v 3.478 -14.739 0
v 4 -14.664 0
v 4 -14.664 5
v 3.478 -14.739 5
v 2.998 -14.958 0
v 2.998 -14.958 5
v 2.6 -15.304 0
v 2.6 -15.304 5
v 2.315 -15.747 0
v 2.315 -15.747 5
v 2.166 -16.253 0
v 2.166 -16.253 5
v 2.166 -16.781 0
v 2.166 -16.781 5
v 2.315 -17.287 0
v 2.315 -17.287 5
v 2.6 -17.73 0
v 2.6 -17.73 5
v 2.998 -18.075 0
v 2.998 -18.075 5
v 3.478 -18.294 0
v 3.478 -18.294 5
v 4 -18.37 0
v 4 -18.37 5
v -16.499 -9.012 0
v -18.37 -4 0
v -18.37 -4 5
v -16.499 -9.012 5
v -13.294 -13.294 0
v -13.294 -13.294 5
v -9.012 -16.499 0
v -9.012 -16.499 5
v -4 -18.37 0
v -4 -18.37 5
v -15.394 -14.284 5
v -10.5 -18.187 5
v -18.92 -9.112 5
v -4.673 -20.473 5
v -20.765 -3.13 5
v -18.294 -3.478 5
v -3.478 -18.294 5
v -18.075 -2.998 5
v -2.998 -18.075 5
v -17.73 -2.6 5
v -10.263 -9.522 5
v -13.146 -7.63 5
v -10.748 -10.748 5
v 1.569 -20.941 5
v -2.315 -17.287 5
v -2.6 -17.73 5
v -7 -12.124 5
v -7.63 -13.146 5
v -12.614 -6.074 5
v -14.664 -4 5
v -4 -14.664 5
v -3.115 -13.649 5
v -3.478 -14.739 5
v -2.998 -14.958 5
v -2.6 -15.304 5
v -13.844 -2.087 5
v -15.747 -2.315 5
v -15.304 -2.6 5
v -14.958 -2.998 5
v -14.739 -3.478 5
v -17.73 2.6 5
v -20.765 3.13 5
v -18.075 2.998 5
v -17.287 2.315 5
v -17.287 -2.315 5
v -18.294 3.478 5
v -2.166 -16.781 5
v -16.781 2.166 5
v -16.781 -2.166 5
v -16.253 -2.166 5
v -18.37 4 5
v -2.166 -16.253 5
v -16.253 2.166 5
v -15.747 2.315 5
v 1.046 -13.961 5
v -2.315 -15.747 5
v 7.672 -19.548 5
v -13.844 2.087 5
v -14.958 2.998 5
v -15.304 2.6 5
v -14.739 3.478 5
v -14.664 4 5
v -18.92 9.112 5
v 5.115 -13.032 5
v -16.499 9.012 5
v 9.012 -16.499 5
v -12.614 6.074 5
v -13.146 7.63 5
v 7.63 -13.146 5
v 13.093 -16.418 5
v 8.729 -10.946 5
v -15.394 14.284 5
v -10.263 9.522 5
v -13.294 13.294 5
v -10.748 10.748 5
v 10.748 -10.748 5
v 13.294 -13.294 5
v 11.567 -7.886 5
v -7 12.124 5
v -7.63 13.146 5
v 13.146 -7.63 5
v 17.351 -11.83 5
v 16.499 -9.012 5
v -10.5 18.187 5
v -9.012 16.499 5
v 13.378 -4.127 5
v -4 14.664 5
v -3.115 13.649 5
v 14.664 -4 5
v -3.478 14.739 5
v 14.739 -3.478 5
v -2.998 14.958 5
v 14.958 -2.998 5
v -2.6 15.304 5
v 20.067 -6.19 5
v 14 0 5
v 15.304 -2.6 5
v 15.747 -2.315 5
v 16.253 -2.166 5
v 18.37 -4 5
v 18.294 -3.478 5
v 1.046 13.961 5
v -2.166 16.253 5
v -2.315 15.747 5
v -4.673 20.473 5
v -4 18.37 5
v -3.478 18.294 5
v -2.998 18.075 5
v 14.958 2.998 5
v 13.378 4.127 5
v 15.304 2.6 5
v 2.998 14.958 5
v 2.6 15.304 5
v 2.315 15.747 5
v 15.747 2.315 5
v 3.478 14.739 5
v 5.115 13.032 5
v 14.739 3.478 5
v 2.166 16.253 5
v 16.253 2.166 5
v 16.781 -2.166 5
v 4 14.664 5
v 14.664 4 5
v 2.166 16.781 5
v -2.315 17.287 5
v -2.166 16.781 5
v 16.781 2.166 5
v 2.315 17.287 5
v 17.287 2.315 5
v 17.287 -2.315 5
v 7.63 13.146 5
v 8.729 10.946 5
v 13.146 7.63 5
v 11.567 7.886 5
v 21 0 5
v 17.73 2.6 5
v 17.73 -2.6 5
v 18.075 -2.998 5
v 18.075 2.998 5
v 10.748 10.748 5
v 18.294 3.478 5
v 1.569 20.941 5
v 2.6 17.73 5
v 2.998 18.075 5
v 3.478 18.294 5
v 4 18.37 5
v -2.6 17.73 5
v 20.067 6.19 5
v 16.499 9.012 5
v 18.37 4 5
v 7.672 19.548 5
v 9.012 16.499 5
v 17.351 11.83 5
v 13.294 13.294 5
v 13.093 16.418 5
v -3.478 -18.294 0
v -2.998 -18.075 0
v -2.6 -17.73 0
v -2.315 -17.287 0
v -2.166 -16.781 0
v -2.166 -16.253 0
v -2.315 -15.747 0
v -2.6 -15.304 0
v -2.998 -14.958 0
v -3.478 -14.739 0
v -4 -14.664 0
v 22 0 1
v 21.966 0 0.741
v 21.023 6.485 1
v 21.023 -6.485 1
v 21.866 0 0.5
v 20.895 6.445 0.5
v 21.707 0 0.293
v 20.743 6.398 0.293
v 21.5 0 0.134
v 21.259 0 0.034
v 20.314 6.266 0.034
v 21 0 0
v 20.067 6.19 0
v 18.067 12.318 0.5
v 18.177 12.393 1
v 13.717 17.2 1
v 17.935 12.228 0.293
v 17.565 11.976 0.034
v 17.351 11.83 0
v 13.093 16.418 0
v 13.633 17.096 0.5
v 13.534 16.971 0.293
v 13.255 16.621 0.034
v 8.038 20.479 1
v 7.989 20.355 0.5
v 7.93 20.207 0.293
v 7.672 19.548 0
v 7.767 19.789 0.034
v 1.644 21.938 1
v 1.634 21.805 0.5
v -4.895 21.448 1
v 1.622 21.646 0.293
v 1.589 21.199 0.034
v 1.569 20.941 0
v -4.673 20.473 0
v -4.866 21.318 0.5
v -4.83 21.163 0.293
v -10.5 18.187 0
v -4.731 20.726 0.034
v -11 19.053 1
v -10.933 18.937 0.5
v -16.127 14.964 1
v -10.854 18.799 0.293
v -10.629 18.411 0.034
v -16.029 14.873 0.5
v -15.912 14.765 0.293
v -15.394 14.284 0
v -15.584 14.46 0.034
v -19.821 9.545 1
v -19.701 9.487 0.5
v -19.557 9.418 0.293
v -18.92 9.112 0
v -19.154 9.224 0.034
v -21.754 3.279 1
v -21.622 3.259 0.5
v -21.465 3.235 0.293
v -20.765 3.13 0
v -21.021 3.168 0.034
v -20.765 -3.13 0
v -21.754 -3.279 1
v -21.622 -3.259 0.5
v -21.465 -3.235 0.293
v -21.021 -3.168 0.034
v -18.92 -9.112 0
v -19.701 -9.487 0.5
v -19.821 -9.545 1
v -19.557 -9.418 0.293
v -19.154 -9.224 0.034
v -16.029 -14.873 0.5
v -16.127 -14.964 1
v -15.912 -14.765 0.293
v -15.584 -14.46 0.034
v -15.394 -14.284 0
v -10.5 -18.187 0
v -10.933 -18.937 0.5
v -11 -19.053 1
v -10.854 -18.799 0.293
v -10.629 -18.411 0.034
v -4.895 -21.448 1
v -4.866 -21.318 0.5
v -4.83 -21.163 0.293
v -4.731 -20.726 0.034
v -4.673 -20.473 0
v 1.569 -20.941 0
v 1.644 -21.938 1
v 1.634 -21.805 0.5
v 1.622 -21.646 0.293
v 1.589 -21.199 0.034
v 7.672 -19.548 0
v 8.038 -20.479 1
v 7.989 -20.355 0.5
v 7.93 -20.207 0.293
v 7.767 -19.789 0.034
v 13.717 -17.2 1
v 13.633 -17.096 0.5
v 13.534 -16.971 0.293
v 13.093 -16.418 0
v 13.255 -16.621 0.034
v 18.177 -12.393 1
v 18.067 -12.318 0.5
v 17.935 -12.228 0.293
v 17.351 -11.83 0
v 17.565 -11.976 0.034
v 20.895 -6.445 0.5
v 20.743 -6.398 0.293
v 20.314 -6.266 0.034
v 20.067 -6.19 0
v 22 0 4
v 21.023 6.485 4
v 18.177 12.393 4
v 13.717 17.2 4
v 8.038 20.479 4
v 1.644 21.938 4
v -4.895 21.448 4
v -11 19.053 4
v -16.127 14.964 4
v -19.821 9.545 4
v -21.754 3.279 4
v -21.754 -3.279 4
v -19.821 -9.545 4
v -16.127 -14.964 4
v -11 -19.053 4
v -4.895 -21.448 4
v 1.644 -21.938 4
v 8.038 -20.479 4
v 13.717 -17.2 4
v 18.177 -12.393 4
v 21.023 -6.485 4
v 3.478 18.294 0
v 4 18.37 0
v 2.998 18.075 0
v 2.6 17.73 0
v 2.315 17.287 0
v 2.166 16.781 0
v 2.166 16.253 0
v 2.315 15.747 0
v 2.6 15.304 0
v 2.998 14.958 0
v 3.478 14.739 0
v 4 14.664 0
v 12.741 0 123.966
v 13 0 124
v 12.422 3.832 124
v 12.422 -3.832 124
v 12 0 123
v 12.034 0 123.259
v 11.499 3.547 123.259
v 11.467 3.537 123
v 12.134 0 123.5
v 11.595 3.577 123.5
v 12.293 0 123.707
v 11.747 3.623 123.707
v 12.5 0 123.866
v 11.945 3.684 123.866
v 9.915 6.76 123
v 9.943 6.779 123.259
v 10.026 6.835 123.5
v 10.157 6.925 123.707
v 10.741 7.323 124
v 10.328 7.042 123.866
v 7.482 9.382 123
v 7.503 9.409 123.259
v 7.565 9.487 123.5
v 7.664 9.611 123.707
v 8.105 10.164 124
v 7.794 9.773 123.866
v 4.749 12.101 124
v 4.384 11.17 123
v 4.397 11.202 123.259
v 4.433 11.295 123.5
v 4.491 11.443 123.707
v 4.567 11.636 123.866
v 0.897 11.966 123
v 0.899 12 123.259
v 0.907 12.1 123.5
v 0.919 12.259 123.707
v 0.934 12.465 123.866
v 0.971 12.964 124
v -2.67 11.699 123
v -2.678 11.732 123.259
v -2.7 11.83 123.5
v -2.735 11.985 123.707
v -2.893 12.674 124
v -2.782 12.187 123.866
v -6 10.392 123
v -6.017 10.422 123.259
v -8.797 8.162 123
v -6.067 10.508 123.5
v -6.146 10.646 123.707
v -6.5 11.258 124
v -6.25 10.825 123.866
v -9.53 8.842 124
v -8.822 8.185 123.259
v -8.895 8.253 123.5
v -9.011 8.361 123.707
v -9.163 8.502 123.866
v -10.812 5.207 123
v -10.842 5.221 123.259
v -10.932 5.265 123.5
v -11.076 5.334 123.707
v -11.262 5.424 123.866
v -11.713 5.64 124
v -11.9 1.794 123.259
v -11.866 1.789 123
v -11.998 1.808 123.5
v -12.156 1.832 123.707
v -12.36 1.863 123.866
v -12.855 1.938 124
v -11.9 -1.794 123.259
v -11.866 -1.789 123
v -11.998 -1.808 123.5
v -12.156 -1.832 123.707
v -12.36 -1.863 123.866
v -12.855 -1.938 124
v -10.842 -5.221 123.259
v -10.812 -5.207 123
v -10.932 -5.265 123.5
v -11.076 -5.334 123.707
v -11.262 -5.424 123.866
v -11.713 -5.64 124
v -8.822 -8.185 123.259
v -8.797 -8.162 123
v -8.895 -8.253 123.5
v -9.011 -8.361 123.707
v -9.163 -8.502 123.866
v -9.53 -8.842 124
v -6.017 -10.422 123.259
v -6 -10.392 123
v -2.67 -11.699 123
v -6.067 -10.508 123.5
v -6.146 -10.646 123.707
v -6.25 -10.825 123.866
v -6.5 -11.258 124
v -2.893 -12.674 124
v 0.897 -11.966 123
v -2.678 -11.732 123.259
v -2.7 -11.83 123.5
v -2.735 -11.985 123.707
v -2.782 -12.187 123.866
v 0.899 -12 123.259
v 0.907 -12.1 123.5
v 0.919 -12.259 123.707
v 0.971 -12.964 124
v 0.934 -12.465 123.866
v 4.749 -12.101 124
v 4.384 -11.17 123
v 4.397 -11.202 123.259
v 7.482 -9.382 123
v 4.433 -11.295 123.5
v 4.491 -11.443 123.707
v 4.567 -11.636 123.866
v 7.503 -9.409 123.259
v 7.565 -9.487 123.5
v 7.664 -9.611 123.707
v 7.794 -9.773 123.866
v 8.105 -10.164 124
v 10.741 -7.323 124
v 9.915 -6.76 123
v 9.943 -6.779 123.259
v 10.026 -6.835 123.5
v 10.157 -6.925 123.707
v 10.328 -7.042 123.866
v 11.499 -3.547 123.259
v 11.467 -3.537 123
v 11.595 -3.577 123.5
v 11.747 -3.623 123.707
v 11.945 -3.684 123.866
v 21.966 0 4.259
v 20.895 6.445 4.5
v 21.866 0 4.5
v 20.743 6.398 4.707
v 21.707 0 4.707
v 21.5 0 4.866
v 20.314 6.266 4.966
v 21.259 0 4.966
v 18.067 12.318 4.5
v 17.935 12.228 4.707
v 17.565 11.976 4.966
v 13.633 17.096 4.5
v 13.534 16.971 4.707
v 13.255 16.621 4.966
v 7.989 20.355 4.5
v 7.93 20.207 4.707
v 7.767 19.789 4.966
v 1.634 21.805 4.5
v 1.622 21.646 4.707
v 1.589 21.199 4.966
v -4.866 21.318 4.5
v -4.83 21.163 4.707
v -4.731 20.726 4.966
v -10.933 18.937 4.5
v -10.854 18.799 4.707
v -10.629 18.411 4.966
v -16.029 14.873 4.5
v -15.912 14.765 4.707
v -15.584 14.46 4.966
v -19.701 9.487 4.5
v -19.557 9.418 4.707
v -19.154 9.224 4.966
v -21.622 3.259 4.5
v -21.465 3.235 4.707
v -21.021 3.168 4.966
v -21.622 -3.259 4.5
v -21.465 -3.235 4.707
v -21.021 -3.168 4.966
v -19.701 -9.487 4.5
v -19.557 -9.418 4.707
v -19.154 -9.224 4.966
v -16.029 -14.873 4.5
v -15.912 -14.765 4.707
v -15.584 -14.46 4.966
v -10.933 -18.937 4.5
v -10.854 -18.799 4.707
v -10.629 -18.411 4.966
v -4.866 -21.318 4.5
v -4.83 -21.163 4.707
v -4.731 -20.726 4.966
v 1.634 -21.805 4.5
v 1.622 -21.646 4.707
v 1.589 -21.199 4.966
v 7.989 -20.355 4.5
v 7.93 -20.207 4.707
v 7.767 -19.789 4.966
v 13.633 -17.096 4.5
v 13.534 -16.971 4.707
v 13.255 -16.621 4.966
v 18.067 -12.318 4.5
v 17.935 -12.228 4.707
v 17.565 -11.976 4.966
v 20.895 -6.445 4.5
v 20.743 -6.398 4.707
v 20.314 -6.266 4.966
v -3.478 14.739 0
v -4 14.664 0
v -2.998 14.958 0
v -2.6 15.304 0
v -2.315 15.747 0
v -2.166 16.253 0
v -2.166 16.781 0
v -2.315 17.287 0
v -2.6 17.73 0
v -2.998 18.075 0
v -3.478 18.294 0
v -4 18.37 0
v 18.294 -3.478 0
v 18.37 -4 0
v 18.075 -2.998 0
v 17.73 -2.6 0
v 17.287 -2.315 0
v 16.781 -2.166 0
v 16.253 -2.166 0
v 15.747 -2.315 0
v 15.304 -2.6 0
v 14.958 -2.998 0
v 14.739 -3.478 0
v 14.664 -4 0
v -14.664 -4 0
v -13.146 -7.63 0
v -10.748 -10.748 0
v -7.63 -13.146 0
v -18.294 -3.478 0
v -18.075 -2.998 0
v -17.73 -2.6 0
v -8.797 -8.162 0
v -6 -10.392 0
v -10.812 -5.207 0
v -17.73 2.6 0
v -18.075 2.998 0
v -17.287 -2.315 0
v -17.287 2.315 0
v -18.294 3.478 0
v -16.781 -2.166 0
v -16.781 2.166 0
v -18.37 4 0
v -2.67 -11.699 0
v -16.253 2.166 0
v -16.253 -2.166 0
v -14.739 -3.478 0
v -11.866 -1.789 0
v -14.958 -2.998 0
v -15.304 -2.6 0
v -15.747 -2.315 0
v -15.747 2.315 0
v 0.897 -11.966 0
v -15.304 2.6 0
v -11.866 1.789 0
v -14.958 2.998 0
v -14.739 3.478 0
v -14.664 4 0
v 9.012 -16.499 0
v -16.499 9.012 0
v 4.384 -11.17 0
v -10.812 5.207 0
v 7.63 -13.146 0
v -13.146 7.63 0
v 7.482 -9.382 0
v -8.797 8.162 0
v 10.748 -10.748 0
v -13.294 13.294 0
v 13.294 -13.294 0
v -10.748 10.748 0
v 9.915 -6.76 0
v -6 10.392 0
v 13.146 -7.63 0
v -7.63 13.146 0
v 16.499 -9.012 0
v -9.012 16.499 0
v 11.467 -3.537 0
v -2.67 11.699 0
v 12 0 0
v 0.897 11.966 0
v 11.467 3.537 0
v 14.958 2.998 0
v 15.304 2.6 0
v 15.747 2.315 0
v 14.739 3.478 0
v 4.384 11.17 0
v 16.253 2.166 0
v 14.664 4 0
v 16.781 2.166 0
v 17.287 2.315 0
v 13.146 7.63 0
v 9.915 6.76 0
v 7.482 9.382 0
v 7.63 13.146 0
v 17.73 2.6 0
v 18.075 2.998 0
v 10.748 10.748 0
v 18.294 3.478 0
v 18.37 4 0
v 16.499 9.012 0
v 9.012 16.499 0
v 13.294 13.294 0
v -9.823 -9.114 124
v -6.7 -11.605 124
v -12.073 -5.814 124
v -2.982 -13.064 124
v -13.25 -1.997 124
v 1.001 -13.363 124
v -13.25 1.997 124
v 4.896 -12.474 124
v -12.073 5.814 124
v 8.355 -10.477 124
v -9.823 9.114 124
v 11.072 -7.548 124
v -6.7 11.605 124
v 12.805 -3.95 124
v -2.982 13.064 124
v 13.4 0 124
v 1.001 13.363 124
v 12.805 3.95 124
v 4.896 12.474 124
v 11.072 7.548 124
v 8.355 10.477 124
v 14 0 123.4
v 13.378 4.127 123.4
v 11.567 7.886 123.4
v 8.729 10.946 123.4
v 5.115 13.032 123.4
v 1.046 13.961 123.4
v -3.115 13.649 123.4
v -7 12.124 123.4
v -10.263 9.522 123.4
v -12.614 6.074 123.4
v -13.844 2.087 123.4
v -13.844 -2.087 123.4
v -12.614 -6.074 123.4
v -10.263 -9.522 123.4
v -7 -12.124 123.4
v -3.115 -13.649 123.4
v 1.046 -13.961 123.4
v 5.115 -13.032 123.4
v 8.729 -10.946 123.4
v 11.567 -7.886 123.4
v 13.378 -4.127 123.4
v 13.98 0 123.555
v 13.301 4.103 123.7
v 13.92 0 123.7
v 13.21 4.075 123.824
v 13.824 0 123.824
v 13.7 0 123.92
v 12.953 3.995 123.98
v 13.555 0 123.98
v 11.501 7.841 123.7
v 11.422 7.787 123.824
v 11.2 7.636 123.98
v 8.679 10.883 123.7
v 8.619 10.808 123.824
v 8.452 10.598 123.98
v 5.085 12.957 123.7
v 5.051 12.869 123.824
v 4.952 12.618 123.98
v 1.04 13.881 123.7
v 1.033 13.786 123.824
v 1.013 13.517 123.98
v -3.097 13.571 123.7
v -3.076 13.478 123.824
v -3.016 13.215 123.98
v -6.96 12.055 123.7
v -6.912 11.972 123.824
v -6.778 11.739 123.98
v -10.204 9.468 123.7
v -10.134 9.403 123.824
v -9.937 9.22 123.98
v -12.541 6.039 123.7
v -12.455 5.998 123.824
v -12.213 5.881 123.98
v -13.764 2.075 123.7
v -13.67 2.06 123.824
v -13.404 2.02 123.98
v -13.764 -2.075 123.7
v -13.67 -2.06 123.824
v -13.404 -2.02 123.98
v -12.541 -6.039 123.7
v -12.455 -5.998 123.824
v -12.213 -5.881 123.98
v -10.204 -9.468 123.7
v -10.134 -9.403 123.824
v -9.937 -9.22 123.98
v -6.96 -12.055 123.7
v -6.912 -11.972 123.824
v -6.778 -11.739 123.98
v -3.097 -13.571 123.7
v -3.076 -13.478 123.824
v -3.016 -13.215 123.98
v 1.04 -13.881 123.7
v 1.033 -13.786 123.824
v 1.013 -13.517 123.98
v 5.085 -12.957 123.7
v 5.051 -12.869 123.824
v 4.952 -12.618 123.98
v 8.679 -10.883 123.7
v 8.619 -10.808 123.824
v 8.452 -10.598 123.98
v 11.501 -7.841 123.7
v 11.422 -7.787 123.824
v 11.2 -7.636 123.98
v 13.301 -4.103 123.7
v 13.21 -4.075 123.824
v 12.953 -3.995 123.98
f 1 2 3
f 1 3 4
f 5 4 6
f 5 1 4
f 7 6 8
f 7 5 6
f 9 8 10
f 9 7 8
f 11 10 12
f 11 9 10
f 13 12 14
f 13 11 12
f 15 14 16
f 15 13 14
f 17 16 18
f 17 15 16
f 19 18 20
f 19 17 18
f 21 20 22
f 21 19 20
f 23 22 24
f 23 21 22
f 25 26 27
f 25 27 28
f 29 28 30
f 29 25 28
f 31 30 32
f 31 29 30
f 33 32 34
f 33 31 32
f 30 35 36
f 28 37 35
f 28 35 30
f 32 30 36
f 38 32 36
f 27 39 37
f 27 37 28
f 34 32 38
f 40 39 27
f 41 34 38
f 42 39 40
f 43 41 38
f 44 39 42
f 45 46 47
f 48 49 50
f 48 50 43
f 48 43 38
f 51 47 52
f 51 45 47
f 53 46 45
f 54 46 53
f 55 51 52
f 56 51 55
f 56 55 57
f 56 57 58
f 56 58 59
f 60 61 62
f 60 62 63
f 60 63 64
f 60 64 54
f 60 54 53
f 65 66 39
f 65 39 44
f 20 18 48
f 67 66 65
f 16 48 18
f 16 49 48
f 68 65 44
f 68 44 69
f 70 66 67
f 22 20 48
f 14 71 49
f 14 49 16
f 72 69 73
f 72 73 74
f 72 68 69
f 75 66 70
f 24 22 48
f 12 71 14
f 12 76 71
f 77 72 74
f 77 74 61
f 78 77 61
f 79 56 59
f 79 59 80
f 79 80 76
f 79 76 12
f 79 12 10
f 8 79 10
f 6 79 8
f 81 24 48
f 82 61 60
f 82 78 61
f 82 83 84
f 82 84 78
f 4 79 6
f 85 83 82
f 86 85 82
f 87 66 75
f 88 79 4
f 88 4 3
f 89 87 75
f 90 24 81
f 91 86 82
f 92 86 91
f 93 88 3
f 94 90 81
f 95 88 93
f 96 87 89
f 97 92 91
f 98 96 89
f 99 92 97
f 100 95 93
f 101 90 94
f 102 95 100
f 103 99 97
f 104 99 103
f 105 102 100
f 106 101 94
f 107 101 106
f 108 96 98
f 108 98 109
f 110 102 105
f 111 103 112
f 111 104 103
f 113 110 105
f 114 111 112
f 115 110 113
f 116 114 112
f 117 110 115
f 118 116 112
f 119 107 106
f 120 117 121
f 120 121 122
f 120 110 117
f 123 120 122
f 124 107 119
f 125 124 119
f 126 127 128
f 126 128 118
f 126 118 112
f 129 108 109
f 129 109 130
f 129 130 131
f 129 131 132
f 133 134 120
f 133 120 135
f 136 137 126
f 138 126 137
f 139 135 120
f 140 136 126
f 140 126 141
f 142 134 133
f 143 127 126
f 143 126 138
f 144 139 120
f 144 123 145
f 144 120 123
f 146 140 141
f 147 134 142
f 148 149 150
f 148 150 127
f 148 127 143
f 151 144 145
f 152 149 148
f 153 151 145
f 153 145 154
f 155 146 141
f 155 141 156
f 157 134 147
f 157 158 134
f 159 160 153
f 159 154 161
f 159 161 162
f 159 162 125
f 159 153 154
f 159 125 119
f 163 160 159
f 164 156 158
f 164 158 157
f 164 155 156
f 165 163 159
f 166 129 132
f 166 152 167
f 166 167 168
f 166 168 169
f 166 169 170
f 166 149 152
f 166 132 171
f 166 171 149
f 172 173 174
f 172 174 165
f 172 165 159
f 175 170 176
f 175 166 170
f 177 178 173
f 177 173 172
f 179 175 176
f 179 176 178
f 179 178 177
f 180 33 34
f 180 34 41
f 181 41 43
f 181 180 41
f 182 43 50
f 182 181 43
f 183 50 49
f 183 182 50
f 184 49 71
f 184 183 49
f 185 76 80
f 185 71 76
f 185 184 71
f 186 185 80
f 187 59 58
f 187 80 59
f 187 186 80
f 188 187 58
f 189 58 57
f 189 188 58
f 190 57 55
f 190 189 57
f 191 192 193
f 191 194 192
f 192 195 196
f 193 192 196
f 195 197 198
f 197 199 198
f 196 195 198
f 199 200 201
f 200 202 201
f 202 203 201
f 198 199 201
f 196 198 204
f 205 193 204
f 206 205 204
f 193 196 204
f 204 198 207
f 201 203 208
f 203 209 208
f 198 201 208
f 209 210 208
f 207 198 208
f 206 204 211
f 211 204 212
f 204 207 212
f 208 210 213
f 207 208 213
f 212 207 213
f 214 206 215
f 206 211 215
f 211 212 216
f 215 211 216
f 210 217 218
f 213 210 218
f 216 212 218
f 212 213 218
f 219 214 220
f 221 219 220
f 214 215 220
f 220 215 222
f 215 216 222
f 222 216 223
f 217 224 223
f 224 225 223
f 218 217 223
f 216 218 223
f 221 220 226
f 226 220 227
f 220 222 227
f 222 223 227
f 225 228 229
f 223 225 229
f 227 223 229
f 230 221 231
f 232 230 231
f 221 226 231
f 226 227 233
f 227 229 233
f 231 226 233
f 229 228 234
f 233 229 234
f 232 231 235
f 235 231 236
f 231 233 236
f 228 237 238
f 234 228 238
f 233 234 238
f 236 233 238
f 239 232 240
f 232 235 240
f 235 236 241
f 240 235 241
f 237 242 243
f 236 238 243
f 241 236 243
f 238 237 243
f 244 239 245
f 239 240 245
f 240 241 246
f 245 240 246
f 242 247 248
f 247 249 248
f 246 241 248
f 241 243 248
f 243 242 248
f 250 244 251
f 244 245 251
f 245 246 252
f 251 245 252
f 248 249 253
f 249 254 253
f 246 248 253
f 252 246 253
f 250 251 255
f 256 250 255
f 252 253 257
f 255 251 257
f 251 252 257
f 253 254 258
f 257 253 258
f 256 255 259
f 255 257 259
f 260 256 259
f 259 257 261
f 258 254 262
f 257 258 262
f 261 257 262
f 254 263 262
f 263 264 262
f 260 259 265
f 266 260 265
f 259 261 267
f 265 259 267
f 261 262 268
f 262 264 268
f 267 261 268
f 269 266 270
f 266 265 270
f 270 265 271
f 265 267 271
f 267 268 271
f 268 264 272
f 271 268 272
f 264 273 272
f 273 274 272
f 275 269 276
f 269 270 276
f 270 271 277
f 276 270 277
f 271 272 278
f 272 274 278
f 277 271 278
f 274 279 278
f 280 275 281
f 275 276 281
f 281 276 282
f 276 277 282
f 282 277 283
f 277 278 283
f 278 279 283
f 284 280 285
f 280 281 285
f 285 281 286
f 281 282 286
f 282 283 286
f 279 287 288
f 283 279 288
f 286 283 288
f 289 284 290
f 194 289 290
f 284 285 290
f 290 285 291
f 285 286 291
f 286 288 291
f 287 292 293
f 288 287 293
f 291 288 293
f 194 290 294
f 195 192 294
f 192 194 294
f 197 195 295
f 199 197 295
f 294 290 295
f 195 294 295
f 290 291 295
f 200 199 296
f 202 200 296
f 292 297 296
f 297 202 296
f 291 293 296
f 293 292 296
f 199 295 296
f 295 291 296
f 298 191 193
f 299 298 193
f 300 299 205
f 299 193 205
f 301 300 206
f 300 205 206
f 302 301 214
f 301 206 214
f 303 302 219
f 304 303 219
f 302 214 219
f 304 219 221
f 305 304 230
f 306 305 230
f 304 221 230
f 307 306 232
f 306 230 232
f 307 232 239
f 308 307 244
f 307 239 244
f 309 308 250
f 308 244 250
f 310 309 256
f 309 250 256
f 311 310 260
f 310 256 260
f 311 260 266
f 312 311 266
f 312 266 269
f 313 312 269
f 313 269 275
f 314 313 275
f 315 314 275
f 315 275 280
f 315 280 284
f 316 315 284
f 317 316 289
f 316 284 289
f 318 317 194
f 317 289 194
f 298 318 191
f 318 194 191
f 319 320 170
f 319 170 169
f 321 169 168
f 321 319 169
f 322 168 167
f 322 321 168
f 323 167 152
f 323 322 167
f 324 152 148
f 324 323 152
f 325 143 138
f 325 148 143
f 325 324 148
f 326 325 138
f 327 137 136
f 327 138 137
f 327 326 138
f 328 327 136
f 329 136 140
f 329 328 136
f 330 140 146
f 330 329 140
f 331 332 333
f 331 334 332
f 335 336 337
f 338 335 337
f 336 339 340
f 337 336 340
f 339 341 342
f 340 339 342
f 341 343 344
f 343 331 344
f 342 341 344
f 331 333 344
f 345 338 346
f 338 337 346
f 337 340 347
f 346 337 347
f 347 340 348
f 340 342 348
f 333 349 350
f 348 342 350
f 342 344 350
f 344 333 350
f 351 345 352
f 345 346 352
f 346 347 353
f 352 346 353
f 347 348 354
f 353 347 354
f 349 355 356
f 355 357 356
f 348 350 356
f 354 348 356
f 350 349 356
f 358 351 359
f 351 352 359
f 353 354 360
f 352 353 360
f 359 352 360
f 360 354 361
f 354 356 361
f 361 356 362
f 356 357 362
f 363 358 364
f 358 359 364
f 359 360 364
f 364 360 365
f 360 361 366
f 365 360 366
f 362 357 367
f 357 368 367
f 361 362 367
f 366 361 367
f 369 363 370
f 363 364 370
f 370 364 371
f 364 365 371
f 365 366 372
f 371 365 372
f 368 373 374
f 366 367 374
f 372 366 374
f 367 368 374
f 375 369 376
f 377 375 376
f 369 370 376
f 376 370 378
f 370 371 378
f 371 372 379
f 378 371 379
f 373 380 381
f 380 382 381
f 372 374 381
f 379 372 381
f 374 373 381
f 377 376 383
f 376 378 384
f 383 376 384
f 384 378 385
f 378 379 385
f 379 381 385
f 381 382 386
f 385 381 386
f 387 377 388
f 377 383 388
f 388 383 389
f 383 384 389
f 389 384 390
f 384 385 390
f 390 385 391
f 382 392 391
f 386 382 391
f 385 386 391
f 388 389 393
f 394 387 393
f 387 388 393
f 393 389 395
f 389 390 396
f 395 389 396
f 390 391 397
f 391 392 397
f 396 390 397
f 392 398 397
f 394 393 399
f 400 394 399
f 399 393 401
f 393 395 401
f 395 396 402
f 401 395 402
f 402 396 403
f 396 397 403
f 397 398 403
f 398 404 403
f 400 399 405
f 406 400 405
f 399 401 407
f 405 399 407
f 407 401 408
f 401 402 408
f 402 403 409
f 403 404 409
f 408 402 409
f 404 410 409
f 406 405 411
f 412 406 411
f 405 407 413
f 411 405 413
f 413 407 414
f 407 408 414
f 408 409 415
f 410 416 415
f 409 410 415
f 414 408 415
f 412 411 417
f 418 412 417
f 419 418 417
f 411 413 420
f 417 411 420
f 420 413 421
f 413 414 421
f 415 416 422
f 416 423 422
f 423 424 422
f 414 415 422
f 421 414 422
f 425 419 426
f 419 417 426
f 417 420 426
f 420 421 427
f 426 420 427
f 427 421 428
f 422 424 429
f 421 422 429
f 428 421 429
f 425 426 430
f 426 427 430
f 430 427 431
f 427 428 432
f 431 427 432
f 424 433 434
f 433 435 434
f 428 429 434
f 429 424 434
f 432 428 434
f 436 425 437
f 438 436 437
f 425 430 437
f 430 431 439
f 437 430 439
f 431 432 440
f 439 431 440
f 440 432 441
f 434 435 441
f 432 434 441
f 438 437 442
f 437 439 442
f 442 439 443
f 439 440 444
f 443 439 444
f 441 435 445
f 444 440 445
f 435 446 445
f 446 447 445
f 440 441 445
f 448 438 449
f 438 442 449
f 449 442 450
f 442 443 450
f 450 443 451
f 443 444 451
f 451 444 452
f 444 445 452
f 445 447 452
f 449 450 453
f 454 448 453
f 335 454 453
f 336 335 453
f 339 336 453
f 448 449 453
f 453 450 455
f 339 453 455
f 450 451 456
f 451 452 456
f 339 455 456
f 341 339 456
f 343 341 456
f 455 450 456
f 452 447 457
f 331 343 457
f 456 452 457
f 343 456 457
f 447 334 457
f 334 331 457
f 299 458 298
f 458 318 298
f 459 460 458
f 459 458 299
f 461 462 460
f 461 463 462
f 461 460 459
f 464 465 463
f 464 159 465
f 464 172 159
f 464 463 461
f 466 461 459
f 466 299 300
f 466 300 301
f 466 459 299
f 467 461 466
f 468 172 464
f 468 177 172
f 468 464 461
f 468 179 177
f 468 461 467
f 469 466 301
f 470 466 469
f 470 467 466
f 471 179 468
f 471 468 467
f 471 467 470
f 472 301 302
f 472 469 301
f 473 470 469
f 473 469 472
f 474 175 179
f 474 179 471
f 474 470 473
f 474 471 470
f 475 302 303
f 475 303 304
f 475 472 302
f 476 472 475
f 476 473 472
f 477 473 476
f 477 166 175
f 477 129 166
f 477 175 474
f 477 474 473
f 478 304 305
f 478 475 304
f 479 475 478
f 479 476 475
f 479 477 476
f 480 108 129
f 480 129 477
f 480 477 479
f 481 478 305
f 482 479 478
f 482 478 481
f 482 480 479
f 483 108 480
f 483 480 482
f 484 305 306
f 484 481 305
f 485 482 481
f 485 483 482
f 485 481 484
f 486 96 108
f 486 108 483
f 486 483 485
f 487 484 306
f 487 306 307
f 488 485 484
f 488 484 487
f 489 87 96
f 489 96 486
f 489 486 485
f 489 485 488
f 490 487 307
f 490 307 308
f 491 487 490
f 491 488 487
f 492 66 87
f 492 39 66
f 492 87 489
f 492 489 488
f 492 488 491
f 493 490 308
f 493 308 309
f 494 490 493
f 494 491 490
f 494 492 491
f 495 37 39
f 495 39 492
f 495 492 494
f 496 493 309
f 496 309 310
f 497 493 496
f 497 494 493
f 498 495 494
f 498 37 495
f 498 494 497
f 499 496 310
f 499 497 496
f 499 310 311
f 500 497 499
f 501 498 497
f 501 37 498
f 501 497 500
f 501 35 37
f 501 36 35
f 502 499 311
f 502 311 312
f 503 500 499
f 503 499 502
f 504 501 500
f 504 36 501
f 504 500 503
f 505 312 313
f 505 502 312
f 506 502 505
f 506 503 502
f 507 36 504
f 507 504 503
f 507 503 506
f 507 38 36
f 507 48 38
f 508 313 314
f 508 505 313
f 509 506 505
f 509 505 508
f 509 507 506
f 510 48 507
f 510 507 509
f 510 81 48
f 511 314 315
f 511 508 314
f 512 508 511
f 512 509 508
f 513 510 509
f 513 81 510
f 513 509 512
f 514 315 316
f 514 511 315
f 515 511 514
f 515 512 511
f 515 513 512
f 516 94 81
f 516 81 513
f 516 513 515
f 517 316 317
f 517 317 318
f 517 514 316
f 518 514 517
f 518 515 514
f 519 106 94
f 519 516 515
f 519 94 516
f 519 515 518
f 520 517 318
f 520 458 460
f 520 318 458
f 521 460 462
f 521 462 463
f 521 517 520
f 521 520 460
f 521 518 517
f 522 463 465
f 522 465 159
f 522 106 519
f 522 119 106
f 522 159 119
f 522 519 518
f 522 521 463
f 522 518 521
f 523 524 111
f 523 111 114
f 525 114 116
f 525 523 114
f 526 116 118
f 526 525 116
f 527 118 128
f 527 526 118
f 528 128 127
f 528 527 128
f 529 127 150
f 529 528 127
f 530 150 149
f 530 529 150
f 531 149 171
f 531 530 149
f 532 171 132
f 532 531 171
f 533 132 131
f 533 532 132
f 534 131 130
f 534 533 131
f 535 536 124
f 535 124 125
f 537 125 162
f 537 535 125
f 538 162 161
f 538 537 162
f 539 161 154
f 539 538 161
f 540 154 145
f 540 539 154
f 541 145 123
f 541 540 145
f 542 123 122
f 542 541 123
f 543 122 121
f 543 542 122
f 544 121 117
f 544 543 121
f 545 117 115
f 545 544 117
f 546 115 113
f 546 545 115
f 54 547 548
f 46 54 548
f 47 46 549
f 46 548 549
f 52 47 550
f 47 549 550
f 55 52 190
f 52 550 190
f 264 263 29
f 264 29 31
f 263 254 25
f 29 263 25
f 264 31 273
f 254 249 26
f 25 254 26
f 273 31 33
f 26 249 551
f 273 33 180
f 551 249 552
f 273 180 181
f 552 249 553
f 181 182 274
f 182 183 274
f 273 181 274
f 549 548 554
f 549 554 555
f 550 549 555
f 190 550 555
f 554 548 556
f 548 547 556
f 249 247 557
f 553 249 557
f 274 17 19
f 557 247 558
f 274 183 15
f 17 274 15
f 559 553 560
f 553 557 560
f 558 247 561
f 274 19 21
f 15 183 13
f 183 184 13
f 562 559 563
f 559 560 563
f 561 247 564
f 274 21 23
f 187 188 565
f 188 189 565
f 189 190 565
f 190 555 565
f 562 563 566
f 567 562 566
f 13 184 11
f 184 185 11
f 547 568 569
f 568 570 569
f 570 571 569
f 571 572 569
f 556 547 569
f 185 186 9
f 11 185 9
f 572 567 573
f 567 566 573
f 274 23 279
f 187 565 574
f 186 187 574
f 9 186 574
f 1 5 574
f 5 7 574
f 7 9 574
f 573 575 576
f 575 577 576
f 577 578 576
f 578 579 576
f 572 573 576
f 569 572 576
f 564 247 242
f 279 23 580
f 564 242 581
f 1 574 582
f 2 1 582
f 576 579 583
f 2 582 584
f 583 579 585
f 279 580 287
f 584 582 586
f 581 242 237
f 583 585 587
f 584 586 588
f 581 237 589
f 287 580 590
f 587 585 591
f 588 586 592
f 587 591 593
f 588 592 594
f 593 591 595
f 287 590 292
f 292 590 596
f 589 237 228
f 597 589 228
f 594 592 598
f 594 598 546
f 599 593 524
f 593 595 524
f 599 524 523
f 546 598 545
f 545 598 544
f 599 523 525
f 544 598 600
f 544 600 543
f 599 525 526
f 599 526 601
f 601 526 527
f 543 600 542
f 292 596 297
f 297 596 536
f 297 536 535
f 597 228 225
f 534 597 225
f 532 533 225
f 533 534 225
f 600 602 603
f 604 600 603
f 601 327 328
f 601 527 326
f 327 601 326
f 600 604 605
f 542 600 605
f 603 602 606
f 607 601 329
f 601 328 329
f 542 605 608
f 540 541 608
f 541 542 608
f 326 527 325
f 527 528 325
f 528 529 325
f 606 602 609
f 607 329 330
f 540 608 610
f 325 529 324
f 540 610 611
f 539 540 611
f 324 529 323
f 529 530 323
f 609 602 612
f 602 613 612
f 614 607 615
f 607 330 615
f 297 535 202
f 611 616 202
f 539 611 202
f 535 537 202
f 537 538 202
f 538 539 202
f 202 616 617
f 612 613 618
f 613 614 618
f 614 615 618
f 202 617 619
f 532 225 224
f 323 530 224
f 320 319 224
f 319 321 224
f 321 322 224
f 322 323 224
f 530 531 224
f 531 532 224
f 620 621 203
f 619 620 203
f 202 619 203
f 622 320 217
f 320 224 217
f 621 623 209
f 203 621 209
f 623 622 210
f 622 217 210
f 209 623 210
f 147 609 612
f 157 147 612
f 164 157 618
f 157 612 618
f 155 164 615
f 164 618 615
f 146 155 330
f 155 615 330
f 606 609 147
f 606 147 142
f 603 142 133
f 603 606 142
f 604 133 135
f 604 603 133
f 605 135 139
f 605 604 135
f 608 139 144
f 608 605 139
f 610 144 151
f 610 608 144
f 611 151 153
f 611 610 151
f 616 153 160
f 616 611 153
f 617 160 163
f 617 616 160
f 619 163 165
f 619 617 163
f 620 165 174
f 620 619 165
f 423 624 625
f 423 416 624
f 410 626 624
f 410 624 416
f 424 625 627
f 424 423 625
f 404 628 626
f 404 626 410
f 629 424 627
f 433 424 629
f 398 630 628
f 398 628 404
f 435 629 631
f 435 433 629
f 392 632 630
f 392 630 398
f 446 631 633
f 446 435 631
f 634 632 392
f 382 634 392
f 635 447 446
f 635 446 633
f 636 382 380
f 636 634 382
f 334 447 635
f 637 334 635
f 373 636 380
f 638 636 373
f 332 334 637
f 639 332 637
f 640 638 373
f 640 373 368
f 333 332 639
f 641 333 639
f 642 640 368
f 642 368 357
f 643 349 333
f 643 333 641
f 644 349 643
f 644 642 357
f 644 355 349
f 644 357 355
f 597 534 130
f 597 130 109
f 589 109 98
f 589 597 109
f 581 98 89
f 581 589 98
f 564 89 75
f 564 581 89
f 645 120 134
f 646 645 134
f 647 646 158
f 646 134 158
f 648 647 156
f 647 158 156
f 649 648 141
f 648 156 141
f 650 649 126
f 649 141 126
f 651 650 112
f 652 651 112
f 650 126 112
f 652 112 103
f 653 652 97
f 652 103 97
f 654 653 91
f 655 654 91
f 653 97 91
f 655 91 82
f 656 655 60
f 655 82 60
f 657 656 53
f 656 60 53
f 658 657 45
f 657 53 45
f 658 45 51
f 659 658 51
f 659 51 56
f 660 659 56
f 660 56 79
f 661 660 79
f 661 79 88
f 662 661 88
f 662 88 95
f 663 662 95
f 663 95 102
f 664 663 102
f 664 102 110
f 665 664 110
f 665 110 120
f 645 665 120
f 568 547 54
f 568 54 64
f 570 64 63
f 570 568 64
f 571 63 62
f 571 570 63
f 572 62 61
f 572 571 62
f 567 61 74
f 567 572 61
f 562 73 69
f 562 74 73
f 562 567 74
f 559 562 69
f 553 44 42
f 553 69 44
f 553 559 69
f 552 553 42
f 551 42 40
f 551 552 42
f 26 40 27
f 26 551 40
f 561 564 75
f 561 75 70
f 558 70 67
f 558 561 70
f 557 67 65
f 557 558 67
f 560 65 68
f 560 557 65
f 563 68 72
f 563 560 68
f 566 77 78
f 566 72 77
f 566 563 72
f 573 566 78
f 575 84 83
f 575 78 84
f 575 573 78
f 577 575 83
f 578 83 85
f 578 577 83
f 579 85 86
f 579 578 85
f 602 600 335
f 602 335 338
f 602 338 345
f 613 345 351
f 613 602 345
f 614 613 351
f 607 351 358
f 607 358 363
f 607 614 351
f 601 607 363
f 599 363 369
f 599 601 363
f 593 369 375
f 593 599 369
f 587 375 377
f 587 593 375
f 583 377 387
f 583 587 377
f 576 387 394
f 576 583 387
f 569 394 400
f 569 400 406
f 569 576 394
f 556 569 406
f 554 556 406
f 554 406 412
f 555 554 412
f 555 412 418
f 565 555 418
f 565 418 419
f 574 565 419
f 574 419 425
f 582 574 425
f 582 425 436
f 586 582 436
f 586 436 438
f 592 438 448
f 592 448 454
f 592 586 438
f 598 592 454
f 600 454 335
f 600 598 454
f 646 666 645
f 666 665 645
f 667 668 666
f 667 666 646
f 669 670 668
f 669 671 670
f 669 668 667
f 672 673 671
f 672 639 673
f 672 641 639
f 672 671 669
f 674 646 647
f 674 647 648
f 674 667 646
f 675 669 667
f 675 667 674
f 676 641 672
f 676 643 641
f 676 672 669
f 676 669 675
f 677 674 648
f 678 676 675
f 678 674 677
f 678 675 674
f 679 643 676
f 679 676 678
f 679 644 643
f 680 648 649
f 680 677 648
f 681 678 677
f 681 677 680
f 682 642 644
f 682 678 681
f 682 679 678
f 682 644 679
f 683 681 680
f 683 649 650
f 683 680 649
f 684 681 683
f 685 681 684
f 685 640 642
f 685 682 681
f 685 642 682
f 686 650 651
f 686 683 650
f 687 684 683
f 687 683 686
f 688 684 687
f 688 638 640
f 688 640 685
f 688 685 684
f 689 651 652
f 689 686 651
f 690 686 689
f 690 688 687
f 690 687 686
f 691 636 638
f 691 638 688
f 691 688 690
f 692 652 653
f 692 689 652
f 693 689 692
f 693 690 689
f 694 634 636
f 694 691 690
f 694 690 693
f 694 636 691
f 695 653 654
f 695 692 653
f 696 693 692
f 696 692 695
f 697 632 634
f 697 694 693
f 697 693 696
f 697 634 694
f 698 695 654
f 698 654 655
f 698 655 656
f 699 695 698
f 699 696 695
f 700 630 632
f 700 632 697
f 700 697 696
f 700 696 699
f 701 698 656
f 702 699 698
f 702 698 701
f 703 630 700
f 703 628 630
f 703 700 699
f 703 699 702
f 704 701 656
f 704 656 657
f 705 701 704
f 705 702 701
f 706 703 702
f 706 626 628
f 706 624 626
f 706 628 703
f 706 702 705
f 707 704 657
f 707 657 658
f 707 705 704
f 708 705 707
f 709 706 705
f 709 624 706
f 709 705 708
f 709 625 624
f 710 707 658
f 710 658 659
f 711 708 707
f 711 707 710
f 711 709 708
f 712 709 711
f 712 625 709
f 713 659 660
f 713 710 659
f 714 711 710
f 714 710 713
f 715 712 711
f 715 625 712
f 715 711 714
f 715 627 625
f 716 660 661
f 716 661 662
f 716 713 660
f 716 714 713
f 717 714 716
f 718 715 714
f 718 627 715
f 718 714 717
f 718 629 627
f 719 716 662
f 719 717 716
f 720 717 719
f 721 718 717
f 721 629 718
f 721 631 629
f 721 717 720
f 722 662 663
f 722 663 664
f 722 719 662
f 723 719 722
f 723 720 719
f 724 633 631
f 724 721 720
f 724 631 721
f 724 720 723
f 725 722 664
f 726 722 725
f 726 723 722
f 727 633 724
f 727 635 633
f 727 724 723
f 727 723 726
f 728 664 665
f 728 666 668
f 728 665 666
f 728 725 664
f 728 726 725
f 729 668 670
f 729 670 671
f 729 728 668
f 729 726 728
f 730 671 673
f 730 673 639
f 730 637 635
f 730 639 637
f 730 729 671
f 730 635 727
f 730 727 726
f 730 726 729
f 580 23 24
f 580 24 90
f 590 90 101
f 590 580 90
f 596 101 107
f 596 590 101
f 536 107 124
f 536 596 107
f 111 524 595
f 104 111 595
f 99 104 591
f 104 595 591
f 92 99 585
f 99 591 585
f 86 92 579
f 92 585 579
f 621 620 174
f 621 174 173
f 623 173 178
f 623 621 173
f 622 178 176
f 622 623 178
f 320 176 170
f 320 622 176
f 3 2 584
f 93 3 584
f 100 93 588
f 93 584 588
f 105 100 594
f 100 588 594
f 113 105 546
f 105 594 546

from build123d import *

# Parameters (mm, degrees)
PAD_DEPTH         = 10
ARRAY001_COUNT    = 4
CYLINDER021_R     = 12
CYLINDER021_DEPTH = 124
CYLINDER022_R     = 22
CYLINDER022_DEPTH = 5
FILLET004_R       = 1
CYLINDER020_R     = 14
CYLINDER020_DEPTH = 124
FILLET001_R       = 0.6
FILLET002_R       = 1


with BuildPart() as long_hole_array:
    # Sketch → Pad (new body)
    with BuildSketch(Plane.XY):
        with BuildLine():
            ThreePointArc((-18.36954, -4), (-13.293607, -13.293607), (-4, -18.36954))
            ThreePointArc((-4, -18.36954), (-2.147351, -16.516891), (-4, -14.664242))
            ThreePointArc((-14.664242, -4), (-10.748023, -10.748023), (-4, -14.664242))
            ThreePointArc((-14.664242, -4), (-16.516891, -2.147351), (-18.36954, -4))
        make_face()
    extrude(amount=PAD_DEPTH)

    # Array001: long hole array ×4 about axis
    array001_axis = Axis((0, 0, 0), (0, 0, 1))


with BuildPart() as long_hole_array_1:
    add(long_hole_array.part)
    for i in range(1, ARRAY001_COUNT):
        add(long_hole_array.part.rotate(array001_axis, i * 360 / ARRAY001_COUNT))


with BuildPart() as top_hole_fusion:
    # Cylinder021 → Cylinder021 (new body)
    with BuildSketch(Plane.XY):
        Circle(CYLINDER021_R)
    extrude(amount=CYLINDER021_DEPTH)

    # Fusion004: union long hole array
    add(long_hole_array_1.part)


with BuildPart() as top_bottom_connector_fillet:
    # Cylinder022 → Cylinder022 (new body)
    with BuildSketch(Plane.XY):
        Circle(CYLINDER022_R)
    extrude(amount=CYLINDER022_DEPTH)

    # Fillet004
    fillet004_edges = [top_bottom_connector_fillet.edges().sort_by_distance(p)[0] for p in [
        (-22, 0, 5),
        (-22, 0, 0),
    ]]
    fillet(fillet004_edges, radius=FILLET004_R)


with BuildPart() as top_tube_cut_fillet:
    # Cylinder020 → Cylinder020 (new body)
    with BuildSketch(Plane.XY):
        Circle(CYLINDER020_R)
    extrude(amount=CYLINDER020_DEPTH)

    # Fillet001
    fillet001_edges = [top_tube_cut_fillet.edges().sort_by_distance(p)[0] for p in [
        (-14, 0, 124),
    ]]
    fillet(fillet001_edges, radius=FILLET001_R)

    # Fusion: union top bottom connector fillet
    add(top_bottom_connector_fillet.part)

    # Cut: cut top hole fusion
    add(top_hole_fusion.part, mode=Mode.SUBTRACT)

    # Fillet002
    fillet002_edges = [top_tube_cut_fillet.edges().sort_by_distance(p)[0] for p in [
        (-12, 0, 124),
    ]]
    fillet(fillet002_edges, radius=FILLET002_R)


solid = top_tube_cut_fillet.part
